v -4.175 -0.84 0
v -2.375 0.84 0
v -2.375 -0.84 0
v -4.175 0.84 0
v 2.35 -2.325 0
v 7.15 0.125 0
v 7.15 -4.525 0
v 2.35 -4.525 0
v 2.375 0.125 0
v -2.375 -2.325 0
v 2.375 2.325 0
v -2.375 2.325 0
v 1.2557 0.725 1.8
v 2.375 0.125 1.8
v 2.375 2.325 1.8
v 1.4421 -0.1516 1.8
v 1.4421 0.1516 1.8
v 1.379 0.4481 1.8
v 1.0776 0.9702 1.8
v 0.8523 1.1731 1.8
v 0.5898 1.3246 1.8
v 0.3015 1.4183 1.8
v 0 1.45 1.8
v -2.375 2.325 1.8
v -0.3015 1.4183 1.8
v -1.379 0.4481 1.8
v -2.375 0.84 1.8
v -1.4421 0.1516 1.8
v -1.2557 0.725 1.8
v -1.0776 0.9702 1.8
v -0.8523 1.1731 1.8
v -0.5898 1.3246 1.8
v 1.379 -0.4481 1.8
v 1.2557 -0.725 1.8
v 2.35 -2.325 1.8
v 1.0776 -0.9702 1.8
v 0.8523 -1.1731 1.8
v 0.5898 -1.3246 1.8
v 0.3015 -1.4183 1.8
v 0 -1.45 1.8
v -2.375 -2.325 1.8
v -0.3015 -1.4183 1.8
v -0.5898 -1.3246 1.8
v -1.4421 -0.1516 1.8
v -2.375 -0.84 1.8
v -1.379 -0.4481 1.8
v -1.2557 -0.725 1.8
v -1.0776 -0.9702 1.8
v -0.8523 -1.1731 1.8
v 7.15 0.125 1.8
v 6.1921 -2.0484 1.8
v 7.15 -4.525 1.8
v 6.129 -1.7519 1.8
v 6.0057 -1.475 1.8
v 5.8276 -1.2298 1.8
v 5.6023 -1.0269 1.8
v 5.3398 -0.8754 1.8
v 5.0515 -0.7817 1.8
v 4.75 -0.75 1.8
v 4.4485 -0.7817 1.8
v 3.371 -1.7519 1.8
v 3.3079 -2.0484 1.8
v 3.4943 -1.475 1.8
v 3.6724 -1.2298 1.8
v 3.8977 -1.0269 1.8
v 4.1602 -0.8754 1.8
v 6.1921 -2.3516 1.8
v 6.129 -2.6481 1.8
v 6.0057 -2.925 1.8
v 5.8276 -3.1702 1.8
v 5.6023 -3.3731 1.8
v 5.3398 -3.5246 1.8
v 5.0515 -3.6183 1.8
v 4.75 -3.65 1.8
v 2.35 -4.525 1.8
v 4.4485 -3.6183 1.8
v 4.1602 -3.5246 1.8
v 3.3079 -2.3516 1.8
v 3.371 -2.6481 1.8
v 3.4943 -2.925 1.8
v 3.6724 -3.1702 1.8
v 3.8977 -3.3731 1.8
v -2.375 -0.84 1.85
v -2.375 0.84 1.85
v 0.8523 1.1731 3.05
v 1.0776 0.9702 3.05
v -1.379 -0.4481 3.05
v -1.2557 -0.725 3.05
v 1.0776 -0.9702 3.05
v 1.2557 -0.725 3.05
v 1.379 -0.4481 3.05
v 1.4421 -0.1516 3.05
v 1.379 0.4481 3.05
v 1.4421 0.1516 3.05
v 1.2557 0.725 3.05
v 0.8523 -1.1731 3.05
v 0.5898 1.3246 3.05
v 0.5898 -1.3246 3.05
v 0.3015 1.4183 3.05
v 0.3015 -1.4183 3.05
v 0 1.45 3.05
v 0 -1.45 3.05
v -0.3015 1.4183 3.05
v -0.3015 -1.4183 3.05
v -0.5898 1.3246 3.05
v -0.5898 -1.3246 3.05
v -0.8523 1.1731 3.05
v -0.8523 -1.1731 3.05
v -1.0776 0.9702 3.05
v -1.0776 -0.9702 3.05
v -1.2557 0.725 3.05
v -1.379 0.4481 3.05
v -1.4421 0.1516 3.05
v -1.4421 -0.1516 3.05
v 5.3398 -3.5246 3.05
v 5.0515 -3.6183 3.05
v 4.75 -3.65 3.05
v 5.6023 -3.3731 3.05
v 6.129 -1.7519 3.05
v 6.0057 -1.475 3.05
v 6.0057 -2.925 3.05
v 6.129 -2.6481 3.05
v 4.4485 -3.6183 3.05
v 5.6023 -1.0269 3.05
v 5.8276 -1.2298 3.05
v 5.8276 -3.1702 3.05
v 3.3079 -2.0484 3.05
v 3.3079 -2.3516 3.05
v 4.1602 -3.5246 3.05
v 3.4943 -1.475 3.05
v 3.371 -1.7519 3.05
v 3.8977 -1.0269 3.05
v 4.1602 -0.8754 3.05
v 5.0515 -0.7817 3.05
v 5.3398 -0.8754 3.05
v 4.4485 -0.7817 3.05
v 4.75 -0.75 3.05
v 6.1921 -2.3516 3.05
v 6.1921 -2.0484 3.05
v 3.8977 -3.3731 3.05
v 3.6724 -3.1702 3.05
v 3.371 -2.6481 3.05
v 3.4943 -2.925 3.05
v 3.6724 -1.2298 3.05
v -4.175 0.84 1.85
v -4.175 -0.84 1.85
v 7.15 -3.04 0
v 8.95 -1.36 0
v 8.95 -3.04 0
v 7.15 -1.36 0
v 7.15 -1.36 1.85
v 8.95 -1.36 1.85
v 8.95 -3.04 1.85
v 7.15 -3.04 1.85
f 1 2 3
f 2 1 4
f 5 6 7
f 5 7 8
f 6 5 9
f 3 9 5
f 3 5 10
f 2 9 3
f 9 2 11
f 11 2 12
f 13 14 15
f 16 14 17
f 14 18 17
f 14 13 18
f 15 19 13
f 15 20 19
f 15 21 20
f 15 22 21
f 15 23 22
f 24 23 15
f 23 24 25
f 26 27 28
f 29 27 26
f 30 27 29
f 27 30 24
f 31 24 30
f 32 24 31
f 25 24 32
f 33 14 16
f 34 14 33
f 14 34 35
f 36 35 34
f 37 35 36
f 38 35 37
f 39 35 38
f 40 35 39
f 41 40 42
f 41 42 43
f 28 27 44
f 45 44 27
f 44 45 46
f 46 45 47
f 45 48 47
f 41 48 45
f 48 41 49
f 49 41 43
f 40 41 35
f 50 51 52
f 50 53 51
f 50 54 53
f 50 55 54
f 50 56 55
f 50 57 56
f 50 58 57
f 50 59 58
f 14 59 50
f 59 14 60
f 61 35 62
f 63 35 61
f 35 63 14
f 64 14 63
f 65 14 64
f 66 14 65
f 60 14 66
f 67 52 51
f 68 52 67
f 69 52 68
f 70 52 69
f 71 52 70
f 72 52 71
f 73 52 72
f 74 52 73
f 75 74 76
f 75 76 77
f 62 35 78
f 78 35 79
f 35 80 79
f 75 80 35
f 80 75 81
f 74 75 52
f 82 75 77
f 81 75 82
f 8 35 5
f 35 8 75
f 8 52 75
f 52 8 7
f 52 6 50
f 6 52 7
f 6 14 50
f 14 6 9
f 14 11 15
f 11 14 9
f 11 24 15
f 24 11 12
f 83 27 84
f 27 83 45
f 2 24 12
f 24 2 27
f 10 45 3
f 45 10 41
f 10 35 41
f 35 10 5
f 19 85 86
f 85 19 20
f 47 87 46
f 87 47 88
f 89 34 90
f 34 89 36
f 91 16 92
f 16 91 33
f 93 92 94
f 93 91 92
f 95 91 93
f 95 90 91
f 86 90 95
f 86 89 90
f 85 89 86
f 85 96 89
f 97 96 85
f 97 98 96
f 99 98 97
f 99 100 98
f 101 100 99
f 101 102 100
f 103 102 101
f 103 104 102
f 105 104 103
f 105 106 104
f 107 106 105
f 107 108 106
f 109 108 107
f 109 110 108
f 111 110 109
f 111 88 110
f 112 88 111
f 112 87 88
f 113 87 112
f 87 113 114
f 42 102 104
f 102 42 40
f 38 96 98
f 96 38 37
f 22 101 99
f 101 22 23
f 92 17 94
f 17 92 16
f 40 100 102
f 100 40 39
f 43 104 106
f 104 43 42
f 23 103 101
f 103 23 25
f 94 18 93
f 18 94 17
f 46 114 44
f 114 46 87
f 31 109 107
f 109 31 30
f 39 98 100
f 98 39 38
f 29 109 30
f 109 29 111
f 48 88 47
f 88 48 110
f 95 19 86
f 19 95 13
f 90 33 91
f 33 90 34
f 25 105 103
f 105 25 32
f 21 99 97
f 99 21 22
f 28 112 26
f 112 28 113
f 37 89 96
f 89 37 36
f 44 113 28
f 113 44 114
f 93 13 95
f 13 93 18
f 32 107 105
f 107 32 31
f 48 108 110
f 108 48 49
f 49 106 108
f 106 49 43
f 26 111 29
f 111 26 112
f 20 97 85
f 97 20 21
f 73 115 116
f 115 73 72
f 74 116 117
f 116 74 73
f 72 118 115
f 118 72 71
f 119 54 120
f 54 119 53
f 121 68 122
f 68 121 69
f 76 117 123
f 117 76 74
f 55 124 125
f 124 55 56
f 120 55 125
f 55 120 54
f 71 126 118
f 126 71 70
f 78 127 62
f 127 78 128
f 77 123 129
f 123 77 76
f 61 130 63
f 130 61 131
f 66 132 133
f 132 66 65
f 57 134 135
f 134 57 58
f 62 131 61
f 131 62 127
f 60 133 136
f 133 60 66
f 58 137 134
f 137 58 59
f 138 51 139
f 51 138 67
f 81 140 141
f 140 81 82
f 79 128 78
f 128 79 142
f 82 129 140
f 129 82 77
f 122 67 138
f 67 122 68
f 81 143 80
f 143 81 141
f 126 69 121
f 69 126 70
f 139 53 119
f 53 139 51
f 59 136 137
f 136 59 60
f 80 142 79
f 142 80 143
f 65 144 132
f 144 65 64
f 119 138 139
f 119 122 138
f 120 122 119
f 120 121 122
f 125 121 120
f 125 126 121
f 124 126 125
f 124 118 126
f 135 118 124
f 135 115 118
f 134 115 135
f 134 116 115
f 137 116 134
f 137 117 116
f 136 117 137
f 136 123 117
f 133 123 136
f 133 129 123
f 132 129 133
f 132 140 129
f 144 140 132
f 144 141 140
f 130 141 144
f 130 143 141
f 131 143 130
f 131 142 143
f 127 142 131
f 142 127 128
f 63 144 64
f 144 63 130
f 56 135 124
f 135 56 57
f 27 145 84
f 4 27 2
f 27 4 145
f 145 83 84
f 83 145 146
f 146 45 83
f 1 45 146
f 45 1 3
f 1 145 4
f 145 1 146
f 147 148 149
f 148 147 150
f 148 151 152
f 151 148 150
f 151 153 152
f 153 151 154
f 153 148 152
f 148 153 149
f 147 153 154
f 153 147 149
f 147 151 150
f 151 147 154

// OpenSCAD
// ref. https://drive.google.com/file/d/1-e0rFtCW9m_soP8Karuuz1jSttS8NSBB/view

$fn = 30;
$vpd = 305;
$vpt = [40, 30, 0];
$vpr = [0, 0, 0];

height = 13.15;
width = 6.85;

base_height = 9.55;
base_thickness = 3.05;
base_block_thickness = 1.80;
base_block_1_height = 4.75;
base_block_2_height = base_height - base_block_1_height;
base_block_width = 4.65;
base_connector_R = 2.90;
base_connector_space_height = 5.00;

connector_thickness = 1.85;
connector_height = (height - base_height) / 2;
connector_width = 1.68;

module base_connector() {
  cylinder(r=base_connector_R/2, h=base_thickness-base_block_thickness);
}

module base() {
  linear_extrude(height=base_block_thickness) {

    square(size=[base_block_width, base_block_1_height], center=true);
    translate([width - base_block_width, base_block_1_height]) square(size=[base_block_width, base_block_2_height], center=true);
  }
  translate([0, 0, base_block_thickness]) #base_connector();
  #translate([width - base_block_width, base_block_1_height, base_block_thickness]) base_connector();
}

module connector() {
  linear_extrude(height=connector_thickness) {
    square(size=[connector_width, connector_height], center=true);
  }
}

module socket() {
  rotate([0, 0, -90]) {
    base();
    translate([0, - (base_block_1_height + connector_height)/2]) #connector();
    translate([width - base_block_width, base_height - (base_block_2_height - connector_height)/2]) #connector();
  }
}

function socket_base_height() = base_height;

socket();
